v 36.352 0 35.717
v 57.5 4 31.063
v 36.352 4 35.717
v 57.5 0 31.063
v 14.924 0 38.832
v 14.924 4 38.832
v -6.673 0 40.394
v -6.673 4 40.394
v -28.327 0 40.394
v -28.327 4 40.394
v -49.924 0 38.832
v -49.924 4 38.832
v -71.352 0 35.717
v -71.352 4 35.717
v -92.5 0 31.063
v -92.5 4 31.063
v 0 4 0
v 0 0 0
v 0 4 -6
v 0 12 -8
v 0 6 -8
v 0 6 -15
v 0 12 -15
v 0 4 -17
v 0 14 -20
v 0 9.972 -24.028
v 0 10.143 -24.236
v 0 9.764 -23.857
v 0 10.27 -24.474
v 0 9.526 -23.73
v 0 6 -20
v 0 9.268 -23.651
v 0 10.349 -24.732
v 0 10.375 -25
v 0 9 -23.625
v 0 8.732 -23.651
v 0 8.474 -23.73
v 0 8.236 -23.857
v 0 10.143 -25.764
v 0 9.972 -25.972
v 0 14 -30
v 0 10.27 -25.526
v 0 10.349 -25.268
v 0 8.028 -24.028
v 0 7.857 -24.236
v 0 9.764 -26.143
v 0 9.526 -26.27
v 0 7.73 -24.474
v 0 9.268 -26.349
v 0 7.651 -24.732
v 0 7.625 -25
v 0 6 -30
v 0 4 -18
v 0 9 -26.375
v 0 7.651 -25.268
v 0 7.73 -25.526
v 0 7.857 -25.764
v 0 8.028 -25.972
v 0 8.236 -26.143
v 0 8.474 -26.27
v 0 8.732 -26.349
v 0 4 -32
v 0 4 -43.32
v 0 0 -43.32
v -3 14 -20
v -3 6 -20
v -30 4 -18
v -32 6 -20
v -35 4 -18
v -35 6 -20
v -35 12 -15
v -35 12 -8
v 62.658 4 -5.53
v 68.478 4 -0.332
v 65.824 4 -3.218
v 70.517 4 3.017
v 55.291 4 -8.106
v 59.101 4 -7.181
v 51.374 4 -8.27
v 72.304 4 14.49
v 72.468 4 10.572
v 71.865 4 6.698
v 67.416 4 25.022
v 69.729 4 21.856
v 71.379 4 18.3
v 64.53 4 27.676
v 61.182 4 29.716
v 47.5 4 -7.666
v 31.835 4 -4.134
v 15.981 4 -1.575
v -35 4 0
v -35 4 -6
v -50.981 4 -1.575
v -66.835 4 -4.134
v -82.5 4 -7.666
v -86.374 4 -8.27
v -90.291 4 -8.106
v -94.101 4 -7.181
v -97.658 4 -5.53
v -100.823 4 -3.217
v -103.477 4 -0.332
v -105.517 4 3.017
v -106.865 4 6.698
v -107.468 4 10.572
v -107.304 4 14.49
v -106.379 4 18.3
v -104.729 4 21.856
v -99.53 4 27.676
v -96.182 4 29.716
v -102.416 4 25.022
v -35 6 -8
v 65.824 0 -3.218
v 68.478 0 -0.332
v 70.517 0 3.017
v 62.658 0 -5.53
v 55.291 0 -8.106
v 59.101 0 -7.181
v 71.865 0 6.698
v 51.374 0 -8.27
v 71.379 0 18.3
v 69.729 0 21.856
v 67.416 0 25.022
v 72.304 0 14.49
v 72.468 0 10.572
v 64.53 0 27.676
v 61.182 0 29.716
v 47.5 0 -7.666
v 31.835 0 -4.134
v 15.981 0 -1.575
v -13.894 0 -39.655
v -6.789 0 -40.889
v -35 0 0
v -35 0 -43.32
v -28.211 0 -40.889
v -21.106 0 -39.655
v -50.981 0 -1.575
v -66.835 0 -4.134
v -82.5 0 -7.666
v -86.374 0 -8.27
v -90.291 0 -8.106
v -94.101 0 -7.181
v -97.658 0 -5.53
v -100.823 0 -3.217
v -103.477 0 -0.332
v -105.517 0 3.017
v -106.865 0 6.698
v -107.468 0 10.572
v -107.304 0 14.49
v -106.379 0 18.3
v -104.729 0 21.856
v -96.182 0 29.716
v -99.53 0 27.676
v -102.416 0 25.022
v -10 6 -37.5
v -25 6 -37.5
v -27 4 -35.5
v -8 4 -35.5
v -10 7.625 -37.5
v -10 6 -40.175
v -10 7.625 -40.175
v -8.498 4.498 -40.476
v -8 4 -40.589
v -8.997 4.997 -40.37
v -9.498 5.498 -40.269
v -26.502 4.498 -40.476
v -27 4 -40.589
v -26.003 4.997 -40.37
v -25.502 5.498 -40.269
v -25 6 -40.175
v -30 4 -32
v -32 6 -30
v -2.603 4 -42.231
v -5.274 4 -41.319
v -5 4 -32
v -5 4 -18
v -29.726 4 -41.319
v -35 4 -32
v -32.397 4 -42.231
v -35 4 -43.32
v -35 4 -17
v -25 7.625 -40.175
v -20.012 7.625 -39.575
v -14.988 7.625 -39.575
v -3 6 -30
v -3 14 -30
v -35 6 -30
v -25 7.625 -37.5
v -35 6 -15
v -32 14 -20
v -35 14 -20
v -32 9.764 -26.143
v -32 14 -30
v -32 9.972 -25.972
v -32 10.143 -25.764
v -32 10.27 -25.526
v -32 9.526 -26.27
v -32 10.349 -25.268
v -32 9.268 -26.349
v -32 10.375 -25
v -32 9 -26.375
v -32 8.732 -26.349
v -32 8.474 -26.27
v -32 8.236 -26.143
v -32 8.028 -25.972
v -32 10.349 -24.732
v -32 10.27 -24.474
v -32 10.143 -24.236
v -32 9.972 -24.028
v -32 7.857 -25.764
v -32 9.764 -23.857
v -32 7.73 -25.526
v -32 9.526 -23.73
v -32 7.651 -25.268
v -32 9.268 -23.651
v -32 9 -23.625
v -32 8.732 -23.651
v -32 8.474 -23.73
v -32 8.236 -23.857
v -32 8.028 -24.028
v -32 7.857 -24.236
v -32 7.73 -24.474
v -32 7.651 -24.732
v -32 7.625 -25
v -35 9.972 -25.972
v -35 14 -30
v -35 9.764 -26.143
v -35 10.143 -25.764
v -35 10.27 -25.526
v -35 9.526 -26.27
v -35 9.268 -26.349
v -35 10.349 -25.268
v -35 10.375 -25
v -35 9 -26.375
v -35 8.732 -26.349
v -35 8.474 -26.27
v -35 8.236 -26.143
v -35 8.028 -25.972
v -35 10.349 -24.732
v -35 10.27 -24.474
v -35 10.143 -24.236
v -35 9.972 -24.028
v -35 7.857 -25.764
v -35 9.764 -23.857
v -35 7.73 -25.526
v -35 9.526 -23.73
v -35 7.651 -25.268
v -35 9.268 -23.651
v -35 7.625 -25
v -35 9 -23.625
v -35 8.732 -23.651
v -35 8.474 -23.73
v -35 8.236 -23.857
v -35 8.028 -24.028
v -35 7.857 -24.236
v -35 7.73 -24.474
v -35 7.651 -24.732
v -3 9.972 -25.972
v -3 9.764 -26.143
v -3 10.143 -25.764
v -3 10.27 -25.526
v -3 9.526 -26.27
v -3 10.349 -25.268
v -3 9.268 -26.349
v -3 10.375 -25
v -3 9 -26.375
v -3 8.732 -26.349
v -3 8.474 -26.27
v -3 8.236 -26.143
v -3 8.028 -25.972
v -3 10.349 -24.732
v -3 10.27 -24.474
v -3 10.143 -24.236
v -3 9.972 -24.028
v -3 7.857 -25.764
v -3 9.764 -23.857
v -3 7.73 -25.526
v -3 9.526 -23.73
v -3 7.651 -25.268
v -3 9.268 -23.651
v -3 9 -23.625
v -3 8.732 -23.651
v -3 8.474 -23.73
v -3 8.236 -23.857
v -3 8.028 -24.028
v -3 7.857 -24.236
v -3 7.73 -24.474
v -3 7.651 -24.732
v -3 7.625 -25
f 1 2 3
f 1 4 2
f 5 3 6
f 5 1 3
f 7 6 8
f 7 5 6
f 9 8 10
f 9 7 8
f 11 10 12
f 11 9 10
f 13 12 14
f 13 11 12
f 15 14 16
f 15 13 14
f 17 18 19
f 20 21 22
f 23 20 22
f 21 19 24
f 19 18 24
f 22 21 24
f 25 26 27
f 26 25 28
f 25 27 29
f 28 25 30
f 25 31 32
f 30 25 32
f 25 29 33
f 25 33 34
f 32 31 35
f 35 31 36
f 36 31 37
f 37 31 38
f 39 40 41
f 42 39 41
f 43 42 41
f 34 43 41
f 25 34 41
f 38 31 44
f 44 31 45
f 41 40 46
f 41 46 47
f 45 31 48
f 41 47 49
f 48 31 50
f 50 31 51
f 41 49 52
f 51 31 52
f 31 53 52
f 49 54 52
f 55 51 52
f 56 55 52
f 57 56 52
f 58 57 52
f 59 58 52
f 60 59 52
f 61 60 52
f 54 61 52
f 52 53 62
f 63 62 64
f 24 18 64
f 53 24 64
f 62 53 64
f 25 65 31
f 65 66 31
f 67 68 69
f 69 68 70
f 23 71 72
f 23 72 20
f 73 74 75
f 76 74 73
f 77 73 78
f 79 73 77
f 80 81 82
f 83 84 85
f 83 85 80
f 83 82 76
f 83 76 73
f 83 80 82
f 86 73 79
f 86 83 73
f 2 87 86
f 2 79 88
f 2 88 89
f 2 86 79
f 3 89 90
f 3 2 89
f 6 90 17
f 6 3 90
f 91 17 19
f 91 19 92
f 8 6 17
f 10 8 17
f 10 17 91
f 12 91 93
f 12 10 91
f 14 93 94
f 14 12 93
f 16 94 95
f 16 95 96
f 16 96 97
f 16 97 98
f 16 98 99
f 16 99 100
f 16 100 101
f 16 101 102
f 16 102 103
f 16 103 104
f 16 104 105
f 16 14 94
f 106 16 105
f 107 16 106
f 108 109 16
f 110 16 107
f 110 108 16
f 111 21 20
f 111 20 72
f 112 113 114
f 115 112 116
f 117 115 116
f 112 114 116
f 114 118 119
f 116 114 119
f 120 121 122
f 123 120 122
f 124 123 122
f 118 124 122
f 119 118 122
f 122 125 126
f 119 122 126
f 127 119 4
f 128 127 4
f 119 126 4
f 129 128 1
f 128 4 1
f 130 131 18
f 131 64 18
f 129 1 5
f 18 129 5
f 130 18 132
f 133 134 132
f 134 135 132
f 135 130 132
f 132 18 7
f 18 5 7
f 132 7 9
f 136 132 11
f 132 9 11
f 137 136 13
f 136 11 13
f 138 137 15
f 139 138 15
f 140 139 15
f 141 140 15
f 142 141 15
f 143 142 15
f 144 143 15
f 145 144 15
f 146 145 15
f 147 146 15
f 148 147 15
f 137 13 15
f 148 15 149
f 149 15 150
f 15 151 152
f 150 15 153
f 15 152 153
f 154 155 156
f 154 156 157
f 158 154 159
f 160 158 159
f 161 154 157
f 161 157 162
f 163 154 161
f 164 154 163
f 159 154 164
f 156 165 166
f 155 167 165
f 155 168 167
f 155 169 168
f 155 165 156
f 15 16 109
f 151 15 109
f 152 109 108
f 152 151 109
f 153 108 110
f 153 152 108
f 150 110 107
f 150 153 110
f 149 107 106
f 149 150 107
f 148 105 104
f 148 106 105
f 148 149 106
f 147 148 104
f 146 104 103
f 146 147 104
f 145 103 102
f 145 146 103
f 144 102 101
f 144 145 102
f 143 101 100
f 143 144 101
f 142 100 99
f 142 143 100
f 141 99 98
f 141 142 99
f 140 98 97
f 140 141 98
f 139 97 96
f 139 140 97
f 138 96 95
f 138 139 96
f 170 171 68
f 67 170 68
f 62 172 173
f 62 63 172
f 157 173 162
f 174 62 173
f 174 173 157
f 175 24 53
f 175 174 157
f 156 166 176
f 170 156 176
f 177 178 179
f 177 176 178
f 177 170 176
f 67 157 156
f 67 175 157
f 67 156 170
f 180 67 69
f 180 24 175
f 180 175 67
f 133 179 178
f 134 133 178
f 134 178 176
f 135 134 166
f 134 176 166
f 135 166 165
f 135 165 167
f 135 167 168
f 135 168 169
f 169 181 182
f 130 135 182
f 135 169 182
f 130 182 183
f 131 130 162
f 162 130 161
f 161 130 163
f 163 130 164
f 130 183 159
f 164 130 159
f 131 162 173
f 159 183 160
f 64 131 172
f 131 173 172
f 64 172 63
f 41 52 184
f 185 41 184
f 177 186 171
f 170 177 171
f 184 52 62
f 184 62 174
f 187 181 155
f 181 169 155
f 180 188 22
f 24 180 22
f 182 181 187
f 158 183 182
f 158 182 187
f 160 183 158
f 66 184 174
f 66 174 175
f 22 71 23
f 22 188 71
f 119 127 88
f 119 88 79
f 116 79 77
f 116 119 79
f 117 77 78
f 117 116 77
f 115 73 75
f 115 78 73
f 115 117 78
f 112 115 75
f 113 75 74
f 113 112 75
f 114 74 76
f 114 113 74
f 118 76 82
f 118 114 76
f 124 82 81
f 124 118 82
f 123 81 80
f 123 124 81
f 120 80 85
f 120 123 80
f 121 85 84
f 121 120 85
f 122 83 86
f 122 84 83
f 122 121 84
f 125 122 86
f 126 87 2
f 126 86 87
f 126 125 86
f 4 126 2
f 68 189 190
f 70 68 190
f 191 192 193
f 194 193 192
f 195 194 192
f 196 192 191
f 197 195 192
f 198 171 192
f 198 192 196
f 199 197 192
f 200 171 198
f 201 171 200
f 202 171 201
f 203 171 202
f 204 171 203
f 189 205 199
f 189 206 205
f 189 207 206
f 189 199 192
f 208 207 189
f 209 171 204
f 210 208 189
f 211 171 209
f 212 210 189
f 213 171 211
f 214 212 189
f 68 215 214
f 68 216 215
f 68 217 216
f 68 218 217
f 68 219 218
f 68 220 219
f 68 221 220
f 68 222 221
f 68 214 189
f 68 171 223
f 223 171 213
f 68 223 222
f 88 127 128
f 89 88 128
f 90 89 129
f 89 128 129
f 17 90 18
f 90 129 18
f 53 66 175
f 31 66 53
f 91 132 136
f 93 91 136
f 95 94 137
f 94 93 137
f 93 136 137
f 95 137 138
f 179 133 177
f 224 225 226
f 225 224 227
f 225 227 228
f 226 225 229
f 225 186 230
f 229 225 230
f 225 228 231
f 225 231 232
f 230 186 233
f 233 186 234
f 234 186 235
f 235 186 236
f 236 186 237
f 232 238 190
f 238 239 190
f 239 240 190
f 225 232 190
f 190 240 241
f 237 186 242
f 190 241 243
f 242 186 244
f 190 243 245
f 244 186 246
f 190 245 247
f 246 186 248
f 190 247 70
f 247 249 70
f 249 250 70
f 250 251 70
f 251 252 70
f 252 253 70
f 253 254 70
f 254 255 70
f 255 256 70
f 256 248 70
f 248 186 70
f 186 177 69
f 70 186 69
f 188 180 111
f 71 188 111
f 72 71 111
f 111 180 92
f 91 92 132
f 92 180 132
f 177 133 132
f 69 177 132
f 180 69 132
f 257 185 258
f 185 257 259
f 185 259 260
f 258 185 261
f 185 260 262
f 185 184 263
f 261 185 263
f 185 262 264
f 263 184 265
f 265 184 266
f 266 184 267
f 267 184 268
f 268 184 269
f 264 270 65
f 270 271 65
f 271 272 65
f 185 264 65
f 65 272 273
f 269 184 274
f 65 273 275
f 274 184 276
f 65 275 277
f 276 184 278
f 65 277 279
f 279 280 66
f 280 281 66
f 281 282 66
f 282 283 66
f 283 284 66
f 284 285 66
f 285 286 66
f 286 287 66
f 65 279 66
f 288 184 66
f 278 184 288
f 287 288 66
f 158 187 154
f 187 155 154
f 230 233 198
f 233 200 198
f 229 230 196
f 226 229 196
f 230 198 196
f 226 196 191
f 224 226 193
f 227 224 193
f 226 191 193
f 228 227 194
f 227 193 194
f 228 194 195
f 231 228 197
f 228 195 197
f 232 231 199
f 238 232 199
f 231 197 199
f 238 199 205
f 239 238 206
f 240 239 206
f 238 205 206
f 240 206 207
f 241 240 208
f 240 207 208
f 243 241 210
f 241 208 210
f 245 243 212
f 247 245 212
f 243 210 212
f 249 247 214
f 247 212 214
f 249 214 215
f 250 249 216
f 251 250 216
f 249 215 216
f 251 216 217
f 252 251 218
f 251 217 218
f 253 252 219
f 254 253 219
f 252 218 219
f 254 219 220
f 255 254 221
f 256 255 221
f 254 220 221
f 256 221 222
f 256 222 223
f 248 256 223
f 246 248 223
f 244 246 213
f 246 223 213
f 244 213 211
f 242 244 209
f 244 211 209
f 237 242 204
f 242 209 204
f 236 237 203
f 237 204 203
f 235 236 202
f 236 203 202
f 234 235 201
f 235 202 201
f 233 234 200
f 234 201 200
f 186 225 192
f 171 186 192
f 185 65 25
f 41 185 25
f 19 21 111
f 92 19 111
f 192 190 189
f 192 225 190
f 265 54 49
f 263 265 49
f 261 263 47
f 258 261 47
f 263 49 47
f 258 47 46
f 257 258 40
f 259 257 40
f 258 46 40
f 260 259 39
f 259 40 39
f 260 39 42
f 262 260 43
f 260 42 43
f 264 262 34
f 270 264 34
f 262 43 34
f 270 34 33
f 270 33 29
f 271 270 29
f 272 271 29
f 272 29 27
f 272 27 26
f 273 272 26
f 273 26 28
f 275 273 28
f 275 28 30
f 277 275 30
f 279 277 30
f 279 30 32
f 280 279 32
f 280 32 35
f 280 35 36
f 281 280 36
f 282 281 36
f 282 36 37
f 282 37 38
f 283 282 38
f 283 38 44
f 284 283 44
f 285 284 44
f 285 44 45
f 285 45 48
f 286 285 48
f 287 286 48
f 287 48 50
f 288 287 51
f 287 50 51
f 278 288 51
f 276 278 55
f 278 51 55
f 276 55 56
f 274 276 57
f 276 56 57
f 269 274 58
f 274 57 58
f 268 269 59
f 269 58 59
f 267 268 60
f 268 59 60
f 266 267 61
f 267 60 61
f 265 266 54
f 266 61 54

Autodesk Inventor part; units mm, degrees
ref_plane "YZ Plane" through (0, 0, 0) normal (1, 0, 0) x (0, 1, 0)
ref_plane "XZ Plane" through (0, 0, 0) normal (0, 1, 0) x (-1, 0, 0)
ref_plane "XY Plane" through (0, 0, 0) normal (0, 0, 1) x (1, 0, 0)
sketch "Sketch1" plane through (0, 0, 0) normal (0, 1, 0) x (-1, 0, 0)
  arc A0 (92.5, 31.0634) -> (-57.5, 31.0634) centre (17.5, -259.4104) ccw
  arc A1 (82.5, -7.6665) -> (92.5, 31.0634) centre (87.5, 11.6984) ccw
  arc A2 (-57.5, 31.0634) -> (-47.5, -7.6665) centre (-52.5, 11.6984) ccw
  arc A3 (82.5, -7.6665) -> (-47.5, -7.6665) centre (17.5, -259.4104) ccw
  line L0 (35, 0) -> (0, 0)
  line L1 (0, 0) -> (0, -50)
  line L2 (0, -50) -> (35, -50)
  line L3 (35, -50) -> (35, 0)
  point P0 (40, -0.7704)
  dimension "d0" = 140
  dimension "d1" = 20
  dimension "d2" = 52.5
  dimension "d4" = 300
  dimension "d5" = 50
  dimension "d8" = 35
  dimension "d9" = 52.5
extrude "Extrusion1" add sketch "Sketch1" along normal blind 4
sketch "Sketch2" plane through (0, 4, 0) normal (0, 1, 0) x (1, 0, 0)
  line L0 (0, 30) -> (-3, 30)
  line L1 (-3, 30) -> (-3, 20)
  line L2 (-3, 20) -> (0, 20)
  line L3 (0, 20) -> (0, 30)
  line L4 (-35, 30) -> (-32, 30)
  line L5 (-32, 30) -> (-32, 20)
  line L6 (-32, 20) -> (-35, 20)
  line L7 (-35, 20) -> (-35, 30)
  line L8 (0, 0) -> (0, 50) projected
  line L9 (-35, 50) -> (-35, 0) projected
  point P0 (-35, 25)
  dimension "d10" = 3
  dimension "d11" = 3
  dimension "d12" = 10
extrude "Extrusion2" add sketch "Sketch2" along normal blind 10
sketch "Sketch3" plane through (0, 4, 0) normal (0, 1, 0) x (1, 0, 0)
  line L0 (-35, 15) -> (0, 15)
  line L1 (0, 15) -> (0, 8)
  line L2 (0, 8) -> (-35, 8)
  line L3 (-35, 8) -> (-35, 15)
  line L4 (0, 0) -> (0, 20) projected
  line L5 (-35, 20) -> (-35, 0) projected
  line L6 (-35, 50) -> (-35, 0) projected
  point P0 (-35, 25)
  dimension "d15" = 7
  dimension "d16" = 10
extrude "Extrusion3" add sketch "Sketch3" along normal blind 8
sketch "Sketch4" plane through (0, 0, 0) normal (1, 0, 0) x (0, 0, -1)
  circle A0 centre (25, 9) radius 1.375
  line L0 (30, 4) -> (30, 14) projected
  line L1 (20, 14) -> (30, 14) projected
  point P0 (0, 0)
  point P1 (30, 9)
  point P2 (25, 14)
  dimension "d19" = 2.75
extrude "Extrusion4" cut sketch "Sketch4" against normal through all
sketch "Sketch5" plane through (0, 4, 0) normal (0, 1, 0) x (1, 0, 0)
  line L0 (-25, 37.5) -> (-10, 37.5)
  line L1 (-10, 37.5) -> (-10, 41.5)
  line L2 (-10, 41.5) -> (-25, 41.5)
  line L3 (-25, 41.5) -> (-25, 37.5)
  line L4 (0, 20) -> (0, 30) projected
  line L5 (-35, 50) -> (-35, 30) projected
  line L6 (0, 30) -> (0, 50) projected
  point P0 (0, 0)
  point P1 (-10, 39.5)
  point P2 (0, 25)
  dimension "d22" = 4
  dimension "d23" = 15
  dimension "d26" = 14.5
  dimension "d27" = 10
  dimension "d28" = 10
extrude "Extrusion5" add sketch "Sketch5" along normal blind 3.625
chamfer "Chamfer1" distance 2 angle 45 12 edges at (-17.5, 4, -15) (-32, 4, -25) (-33.5, 4, -30) (-33.5, 4, -20) (-17.5, 4, -8) (-3, 4, -25) (-1.5, 4, -30) (-1.5, 4, -20) (-10, 4, -39.5) (-17.5, 4, -41.5) (-17.5, 4, -37.5) (-25, 4, -39.5)
sketch "Sketch6" plane through (0, 4, 0) normal (0, 1, 0) x (1, 0, 0)
  circle A0 centre (-17.5, 81.5) radius 42
  line L0 (0, 0) -> (0, 50) projected
  line L1 (0, 50) -> (-35, 50) projected
  point P0 (0, 25)
  point P1 (-17.5, 50)
  dimension "d32" = 56.5
  dimension "d33" = 84
extrude "Extrusion6" cut sketch "Sketch6" along normal through all both and the other way through all
equation "\"d2\" = d9"
equation "\"d11\" = d10"
equation "\"d27\" = d28"
properties part number "paddle"
